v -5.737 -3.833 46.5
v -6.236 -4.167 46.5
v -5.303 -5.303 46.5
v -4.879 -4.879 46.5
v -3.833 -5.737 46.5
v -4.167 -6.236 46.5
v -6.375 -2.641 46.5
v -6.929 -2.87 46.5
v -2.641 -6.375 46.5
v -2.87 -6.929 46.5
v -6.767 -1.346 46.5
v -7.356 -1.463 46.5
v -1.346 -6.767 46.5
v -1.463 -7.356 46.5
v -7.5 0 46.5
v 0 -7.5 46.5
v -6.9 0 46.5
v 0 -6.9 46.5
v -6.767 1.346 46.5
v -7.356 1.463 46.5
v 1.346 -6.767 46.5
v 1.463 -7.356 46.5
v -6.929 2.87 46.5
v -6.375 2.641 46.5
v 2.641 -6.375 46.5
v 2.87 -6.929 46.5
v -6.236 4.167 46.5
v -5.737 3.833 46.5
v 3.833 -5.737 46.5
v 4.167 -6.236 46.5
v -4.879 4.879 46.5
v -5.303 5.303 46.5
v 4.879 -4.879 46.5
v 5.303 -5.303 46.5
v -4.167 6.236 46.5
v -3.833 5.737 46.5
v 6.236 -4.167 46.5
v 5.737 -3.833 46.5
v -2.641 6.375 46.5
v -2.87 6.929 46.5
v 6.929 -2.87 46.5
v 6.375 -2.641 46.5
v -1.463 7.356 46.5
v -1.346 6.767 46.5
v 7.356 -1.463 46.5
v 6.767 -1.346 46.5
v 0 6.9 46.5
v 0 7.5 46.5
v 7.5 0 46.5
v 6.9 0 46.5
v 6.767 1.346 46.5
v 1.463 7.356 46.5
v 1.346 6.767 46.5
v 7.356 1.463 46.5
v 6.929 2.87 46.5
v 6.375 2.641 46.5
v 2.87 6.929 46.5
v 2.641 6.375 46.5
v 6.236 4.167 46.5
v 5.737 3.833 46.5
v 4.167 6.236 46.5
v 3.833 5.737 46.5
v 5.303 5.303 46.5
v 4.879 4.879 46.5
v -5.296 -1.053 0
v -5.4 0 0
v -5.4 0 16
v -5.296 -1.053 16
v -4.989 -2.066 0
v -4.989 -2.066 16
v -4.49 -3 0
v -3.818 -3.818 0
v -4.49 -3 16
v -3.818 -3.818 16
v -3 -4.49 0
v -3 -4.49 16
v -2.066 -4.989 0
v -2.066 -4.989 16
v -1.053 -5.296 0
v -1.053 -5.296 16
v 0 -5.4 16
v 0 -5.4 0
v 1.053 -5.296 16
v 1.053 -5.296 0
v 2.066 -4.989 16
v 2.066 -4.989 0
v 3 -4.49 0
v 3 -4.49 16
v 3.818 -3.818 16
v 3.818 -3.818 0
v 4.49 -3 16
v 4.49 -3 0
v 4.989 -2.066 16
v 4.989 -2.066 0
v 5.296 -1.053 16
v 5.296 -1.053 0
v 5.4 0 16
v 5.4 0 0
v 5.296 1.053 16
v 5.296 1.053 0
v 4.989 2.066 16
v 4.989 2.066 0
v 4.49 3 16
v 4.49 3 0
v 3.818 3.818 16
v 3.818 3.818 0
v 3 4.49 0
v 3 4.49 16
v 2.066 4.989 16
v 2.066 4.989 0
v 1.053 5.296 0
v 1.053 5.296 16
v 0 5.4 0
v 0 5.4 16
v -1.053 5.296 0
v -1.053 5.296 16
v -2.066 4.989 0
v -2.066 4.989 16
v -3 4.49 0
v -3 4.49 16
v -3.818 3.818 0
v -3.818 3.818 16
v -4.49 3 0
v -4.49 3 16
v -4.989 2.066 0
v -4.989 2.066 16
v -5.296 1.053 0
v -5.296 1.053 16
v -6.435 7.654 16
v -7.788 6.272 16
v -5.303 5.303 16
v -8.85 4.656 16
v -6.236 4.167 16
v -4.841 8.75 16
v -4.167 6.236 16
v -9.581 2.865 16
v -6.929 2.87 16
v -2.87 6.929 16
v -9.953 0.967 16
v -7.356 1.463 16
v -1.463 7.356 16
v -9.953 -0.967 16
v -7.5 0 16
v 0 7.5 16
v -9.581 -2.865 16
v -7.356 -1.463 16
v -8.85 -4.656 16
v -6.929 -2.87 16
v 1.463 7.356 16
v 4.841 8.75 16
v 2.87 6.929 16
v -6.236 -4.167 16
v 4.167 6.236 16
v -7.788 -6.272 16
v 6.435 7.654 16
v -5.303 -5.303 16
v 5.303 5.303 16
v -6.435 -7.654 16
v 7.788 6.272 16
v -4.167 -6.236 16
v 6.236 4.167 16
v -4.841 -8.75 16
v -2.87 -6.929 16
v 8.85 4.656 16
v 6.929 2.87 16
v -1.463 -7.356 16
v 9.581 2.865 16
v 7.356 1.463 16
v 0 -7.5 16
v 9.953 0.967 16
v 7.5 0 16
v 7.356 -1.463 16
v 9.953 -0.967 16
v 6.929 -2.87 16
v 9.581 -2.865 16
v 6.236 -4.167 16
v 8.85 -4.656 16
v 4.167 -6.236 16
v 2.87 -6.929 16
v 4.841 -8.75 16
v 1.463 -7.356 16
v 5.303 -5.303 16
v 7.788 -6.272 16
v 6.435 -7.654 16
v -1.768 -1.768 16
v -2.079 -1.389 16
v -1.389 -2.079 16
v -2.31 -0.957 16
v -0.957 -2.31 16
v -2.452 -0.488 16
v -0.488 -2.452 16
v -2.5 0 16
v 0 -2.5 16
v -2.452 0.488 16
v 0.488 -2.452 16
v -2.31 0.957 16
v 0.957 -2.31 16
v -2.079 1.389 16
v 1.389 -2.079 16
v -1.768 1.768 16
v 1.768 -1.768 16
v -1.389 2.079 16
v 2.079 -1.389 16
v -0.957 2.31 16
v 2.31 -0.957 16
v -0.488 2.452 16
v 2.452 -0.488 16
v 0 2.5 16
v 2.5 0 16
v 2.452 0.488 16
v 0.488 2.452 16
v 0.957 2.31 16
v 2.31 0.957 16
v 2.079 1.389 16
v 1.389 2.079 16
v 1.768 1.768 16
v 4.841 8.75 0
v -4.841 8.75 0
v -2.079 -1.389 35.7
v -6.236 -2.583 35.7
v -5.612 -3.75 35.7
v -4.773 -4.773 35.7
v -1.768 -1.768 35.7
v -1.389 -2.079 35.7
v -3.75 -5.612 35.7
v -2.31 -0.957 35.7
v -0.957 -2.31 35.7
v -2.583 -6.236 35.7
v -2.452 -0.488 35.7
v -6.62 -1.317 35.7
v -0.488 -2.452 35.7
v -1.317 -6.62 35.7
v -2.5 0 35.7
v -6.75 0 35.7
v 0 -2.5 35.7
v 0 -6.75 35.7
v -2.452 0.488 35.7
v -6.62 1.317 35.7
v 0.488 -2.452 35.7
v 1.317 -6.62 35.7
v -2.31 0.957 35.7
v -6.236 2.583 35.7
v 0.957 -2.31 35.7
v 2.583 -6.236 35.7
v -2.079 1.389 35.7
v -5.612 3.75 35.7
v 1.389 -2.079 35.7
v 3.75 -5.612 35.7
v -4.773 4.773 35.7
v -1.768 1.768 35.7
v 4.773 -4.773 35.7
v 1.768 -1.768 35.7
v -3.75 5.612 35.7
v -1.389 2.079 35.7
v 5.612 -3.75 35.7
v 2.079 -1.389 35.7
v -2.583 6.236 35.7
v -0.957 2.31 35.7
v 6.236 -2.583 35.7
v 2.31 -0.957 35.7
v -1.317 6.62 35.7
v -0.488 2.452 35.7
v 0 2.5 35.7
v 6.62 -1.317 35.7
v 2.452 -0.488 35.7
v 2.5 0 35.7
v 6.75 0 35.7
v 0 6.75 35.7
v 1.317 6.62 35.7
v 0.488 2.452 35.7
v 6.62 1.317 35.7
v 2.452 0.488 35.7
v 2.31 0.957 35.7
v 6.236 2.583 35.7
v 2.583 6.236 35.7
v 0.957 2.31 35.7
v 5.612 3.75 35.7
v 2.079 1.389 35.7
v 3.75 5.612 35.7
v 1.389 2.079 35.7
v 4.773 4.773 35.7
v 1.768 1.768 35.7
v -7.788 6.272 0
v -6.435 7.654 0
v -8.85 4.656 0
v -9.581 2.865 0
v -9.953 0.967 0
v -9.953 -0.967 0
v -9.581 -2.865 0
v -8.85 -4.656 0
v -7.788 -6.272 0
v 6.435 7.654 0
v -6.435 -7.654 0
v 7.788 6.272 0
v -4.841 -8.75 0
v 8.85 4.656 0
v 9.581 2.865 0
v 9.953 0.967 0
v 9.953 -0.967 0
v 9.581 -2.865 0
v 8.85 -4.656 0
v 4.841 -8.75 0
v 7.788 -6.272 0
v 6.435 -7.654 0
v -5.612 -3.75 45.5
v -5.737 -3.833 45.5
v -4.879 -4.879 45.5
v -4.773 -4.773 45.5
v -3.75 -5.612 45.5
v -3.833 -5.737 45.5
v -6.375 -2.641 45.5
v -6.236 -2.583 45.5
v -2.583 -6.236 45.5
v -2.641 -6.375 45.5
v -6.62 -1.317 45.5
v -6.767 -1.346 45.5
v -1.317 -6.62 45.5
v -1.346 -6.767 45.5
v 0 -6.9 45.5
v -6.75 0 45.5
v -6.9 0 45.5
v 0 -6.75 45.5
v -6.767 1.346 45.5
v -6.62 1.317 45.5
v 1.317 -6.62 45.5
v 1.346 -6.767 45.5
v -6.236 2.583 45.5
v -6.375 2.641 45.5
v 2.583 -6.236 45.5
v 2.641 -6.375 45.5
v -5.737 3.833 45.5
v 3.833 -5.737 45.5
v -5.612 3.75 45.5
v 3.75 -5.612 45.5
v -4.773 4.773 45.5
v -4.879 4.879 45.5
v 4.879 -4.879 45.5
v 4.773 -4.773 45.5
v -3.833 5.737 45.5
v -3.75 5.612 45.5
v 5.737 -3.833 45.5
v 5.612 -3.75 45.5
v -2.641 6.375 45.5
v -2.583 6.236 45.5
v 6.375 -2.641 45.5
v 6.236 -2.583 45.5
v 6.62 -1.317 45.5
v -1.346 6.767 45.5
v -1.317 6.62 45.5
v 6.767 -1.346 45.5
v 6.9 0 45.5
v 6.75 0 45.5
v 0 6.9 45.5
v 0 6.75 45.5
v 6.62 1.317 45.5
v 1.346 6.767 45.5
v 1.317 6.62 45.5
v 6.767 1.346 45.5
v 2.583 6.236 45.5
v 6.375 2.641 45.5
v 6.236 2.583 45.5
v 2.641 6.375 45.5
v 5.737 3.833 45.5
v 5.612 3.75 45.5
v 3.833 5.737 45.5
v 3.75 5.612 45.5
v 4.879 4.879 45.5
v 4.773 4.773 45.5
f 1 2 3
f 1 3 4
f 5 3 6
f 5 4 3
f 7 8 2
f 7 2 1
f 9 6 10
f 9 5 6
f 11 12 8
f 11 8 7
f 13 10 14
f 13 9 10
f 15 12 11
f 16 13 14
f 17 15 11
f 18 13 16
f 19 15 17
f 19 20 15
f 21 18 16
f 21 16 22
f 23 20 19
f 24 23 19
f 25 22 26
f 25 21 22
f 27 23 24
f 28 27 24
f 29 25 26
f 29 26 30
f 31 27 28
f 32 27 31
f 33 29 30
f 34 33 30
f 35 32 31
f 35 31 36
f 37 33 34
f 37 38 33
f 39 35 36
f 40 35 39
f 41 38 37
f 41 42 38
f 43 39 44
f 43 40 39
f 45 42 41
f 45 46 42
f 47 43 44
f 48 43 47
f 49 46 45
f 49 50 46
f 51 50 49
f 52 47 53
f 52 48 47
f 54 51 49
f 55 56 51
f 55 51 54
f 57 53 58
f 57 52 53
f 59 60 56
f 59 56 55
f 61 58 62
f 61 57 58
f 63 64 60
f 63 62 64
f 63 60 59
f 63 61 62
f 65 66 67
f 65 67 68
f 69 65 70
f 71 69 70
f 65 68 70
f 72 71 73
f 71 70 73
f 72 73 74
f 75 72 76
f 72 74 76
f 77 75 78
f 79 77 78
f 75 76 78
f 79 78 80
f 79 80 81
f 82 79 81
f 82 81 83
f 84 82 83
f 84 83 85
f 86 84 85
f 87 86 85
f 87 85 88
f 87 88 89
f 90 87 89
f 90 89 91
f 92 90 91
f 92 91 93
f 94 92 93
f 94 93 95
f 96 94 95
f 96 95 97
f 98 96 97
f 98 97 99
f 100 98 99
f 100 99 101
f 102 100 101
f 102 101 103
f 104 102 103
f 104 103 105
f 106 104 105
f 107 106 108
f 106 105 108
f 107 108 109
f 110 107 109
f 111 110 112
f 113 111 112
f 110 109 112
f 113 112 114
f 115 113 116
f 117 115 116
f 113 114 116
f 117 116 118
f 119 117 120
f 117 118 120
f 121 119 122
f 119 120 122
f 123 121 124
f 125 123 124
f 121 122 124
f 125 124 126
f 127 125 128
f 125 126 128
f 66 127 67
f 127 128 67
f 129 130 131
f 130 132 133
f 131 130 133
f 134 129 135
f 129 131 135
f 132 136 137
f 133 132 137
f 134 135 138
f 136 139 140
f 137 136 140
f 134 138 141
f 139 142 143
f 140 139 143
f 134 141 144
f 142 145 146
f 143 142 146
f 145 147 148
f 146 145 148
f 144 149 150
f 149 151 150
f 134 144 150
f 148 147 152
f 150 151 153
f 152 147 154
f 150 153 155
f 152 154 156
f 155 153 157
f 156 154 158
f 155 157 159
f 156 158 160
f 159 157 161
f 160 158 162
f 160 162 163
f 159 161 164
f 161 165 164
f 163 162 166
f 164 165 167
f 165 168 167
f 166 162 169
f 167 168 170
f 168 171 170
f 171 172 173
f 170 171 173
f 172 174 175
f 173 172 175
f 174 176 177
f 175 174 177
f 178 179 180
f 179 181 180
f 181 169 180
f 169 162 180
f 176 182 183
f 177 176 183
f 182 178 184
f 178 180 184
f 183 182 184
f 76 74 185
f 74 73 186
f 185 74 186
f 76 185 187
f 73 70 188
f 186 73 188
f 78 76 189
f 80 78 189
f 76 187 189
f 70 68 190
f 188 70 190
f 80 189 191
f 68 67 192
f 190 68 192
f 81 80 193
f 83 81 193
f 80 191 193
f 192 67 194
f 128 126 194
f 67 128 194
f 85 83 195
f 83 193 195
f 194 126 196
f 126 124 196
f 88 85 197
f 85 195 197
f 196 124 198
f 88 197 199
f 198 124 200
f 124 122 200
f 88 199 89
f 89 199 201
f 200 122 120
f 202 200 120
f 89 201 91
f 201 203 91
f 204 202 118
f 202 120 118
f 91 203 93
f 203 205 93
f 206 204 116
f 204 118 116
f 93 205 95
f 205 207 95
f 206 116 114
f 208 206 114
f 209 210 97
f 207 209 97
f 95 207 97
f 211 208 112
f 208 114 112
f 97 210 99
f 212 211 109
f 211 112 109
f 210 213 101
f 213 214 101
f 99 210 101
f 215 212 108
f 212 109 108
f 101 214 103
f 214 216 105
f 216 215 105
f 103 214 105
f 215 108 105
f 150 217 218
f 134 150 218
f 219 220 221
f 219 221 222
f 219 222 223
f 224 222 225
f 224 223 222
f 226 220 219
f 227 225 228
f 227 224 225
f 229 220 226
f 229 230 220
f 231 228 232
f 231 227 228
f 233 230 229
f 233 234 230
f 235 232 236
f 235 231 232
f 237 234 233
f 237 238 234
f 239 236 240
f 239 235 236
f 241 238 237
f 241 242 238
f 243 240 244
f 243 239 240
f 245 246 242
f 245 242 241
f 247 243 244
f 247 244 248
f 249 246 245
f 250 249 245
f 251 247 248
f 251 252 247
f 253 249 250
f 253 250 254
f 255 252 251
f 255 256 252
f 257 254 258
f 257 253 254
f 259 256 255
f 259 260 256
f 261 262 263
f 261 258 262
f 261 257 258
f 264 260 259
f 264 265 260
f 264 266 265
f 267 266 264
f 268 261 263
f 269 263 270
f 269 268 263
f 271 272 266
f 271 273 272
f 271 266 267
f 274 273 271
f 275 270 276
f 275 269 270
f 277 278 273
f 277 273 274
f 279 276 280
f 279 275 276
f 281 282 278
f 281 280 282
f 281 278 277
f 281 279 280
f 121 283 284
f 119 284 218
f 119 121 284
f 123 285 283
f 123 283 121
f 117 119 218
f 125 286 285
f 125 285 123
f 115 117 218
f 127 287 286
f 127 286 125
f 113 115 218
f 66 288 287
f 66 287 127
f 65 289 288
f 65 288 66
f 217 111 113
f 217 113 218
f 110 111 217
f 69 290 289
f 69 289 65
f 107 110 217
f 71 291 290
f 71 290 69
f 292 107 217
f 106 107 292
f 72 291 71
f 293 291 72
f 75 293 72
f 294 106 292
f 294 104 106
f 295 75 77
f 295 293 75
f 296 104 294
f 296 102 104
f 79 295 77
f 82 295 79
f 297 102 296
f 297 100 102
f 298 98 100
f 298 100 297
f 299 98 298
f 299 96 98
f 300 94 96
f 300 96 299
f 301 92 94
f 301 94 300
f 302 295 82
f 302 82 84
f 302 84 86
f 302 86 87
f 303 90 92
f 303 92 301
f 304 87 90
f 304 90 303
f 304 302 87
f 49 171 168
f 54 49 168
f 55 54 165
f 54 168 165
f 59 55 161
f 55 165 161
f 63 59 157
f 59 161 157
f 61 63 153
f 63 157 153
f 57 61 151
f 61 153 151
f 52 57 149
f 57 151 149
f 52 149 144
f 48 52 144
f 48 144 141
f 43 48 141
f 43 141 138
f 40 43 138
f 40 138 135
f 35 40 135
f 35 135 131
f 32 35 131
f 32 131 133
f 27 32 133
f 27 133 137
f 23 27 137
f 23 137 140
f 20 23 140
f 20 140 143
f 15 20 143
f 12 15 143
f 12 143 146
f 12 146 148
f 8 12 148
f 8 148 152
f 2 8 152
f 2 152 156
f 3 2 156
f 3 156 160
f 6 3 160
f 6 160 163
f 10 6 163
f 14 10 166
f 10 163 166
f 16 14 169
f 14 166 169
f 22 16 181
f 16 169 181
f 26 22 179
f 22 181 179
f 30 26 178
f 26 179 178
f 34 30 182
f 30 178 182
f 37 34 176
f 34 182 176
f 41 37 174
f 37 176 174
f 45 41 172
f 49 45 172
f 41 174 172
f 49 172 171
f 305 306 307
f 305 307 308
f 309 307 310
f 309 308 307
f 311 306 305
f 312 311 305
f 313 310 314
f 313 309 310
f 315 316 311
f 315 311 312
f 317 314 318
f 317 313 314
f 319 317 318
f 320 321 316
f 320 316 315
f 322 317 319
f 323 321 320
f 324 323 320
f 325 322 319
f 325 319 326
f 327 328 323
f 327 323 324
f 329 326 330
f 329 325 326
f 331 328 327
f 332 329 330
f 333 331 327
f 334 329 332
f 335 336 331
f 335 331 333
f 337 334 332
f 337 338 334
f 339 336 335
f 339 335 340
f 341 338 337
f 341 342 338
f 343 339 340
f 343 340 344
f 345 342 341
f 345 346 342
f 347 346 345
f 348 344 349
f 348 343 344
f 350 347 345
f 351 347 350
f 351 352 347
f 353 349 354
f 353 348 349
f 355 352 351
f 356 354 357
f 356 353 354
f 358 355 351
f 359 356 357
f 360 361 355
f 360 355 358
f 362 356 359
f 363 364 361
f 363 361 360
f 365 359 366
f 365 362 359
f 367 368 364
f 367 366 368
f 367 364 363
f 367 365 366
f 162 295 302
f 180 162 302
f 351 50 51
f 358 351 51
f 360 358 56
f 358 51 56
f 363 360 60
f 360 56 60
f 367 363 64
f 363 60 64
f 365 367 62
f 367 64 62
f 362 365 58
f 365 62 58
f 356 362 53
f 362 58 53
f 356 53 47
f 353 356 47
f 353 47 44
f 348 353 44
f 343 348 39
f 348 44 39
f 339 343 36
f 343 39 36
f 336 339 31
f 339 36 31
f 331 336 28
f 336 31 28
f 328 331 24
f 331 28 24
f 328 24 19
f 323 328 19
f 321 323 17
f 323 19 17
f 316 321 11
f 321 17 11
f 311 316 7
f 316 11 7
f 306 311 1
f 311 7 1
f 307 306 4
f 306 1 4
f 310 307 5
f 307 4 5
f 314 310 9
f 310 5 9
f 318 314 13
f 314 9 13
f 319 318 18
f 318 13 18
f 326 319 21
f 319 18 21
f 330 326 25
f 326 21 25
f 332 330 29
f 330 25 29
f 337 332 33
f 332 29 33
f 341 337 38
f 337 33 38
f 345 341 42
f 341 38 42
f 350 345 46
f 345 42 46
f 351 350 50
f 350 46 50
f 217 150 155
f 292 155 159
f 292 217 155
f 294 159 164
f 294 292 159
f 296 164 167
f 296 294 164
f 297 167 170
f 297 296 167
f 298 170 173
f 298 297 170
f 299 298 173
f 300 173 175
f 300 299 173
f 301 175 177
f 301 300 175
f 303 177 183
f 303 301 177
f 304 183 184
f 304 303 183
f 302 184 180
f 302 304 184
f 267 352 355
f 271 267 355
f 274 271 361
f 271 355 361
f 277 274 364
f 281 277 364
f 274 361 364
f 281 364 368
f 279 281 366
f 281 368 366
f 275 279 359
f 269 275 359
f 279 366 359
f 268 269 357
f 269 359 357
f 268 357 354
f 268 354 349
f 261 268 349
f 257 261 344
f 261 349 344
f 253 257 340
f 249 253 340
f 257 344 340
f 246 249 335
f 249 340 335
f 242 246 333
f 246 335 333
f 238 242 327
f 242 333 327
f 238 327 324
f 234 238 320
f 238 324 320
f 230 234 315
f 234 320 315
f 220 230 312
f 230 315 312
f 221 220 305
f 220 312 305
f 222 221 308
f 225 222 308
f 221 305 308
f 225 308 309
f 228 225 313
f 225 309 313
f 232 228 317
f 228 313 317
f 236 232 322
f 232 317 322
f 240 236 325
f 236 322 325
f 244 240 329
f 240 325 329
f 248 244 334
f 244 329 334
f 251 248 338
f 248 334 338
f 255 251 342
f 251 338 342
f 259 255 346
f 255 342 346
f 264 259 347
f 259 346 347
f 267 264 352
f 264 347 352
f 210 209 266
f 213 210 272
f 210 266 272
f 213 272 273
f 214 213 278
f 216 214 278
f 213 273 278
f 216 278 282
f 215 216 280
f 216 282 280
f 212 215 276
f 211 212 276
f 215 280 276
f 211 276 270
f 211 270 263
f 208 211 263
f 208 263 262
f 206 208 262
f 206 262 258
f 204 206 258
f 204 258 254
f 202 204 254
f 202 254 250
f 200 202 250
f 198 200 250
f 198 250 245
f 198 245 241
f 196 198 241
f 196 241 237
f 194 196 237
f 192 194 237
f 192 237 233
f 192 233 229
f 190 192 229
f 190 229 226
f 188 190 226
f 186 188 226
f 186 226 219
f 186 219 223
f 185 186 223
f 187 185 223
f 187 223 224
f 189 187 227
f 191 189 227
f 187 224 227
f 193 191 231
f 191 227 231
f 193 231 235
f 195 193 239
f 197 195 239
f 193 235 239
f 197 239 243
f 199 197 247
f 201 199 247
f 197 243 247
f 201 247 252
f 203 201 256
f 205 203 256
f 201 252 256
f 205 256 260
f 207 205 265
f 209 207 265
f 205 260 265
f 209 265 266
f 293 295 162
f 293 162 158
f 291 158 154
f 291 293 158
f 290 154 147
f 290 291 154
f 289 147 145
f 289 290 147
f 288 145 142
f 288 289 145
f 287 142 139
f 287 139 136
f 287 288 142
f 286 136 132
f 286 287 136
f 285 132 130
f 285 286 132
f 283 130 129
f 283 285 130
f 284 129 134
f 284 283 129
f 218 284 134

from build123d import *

# Parameters (mm, degrees)
F0_W      = 13
F0_H      = 13
F1_DEPTH  = 16
F3_D      = 10.8
F4_R      = 7.5
F5_DEPTH  = 30.5
F6_R      = 6.9
F7_DEPTH  = 1
F8_R      = 6.75
F9_DEPTH  = 9.8
F10_R     = 2.5
F11_DEPTH = 50
F12_R     = 10
F12_W     = 13
F12_H     = 13
F13_DEPTH = 16
F15_DEPTH = 25


with BuildPart() as f1:
    # F0 (on Top) → F1 (new body)
    with BuildSketch(Plane.XY):
        Rectangle(F0_W, F0_H)
    extrude(amount=F1_DEPTH)

    # F3 (through all)
    with Locations(Plane(origin=(0, 0, 0), x_dir=(1, 0, 0), z_dir=(0, 0, -1))):
        with Locations((0, 0)):
            Hole(F3_D / 2)

    # F4 (on face) → F5 (join)
    with BuildSketch(Plane.XY.offset(16)):
        Circle(F4_R)
    extrude(amount=F5_DEPTH)

    # F6 (on face) → F7 (cut)
    with BuildSketch(Plane.XY.offset(46.5)):
        Circle(F6_R)
    extrude(amount=-F7_DEPTH, mode=Mode.SUBTRACT)

    # F8 (on face) → F9 (cut)
    with BuildSketch(Plane.XY.offset(45.5)):
        Circle(F8_R)
    extrude(amount=-F9_DEPTH, mode=Mode.SUBTRACT)

    # F10 (on face) → F11 (cut)
    with BuildSketch(Plane.XY.offset(35.7)):
        Circle(F10_R)
    extrude(amount=-F11_DEPTH, mode=Mode.SUBTRACT)

    # F12 (on face) → F13 (join, through all)
    with BuildSketch(Plane(origin=(0, 0, 0), x_dir=(1, 0, 0), z_dir=(0, 0, -1))):
        Circle(F12_R)
        Rectangle(F12_W, F12_H, mode=Mode.SUBTRACT)
    extrude(amount=-F13_DEPTH)

    # F14 (on face) → F15 (cut)
    with BuildSketch(Plane(origin=(0, 0, 0), x_dir=(1, 0, 0), z_dir=(0, 0, -1))):
        with BuildLine():
            ThreePointArc((4.8412291828, 8.75), (0, 10), (-4.8412291828, 8.75))
            Line((-4.8412291828, 8.75), (4.8412291828, 8.75))
        make_face()
        with BuildLine():
            Line((4.8412291828, -8.75), (-4.8412291828, -8.75))
            ThreePointArc((-4.8412291828, -8.75), (0, -10), (4.8412291828, -8.75))
        make_face()
    extrude(amount=-F15_DEPTH, mode=Mode.SUBTRACT)


solid = f1.part
